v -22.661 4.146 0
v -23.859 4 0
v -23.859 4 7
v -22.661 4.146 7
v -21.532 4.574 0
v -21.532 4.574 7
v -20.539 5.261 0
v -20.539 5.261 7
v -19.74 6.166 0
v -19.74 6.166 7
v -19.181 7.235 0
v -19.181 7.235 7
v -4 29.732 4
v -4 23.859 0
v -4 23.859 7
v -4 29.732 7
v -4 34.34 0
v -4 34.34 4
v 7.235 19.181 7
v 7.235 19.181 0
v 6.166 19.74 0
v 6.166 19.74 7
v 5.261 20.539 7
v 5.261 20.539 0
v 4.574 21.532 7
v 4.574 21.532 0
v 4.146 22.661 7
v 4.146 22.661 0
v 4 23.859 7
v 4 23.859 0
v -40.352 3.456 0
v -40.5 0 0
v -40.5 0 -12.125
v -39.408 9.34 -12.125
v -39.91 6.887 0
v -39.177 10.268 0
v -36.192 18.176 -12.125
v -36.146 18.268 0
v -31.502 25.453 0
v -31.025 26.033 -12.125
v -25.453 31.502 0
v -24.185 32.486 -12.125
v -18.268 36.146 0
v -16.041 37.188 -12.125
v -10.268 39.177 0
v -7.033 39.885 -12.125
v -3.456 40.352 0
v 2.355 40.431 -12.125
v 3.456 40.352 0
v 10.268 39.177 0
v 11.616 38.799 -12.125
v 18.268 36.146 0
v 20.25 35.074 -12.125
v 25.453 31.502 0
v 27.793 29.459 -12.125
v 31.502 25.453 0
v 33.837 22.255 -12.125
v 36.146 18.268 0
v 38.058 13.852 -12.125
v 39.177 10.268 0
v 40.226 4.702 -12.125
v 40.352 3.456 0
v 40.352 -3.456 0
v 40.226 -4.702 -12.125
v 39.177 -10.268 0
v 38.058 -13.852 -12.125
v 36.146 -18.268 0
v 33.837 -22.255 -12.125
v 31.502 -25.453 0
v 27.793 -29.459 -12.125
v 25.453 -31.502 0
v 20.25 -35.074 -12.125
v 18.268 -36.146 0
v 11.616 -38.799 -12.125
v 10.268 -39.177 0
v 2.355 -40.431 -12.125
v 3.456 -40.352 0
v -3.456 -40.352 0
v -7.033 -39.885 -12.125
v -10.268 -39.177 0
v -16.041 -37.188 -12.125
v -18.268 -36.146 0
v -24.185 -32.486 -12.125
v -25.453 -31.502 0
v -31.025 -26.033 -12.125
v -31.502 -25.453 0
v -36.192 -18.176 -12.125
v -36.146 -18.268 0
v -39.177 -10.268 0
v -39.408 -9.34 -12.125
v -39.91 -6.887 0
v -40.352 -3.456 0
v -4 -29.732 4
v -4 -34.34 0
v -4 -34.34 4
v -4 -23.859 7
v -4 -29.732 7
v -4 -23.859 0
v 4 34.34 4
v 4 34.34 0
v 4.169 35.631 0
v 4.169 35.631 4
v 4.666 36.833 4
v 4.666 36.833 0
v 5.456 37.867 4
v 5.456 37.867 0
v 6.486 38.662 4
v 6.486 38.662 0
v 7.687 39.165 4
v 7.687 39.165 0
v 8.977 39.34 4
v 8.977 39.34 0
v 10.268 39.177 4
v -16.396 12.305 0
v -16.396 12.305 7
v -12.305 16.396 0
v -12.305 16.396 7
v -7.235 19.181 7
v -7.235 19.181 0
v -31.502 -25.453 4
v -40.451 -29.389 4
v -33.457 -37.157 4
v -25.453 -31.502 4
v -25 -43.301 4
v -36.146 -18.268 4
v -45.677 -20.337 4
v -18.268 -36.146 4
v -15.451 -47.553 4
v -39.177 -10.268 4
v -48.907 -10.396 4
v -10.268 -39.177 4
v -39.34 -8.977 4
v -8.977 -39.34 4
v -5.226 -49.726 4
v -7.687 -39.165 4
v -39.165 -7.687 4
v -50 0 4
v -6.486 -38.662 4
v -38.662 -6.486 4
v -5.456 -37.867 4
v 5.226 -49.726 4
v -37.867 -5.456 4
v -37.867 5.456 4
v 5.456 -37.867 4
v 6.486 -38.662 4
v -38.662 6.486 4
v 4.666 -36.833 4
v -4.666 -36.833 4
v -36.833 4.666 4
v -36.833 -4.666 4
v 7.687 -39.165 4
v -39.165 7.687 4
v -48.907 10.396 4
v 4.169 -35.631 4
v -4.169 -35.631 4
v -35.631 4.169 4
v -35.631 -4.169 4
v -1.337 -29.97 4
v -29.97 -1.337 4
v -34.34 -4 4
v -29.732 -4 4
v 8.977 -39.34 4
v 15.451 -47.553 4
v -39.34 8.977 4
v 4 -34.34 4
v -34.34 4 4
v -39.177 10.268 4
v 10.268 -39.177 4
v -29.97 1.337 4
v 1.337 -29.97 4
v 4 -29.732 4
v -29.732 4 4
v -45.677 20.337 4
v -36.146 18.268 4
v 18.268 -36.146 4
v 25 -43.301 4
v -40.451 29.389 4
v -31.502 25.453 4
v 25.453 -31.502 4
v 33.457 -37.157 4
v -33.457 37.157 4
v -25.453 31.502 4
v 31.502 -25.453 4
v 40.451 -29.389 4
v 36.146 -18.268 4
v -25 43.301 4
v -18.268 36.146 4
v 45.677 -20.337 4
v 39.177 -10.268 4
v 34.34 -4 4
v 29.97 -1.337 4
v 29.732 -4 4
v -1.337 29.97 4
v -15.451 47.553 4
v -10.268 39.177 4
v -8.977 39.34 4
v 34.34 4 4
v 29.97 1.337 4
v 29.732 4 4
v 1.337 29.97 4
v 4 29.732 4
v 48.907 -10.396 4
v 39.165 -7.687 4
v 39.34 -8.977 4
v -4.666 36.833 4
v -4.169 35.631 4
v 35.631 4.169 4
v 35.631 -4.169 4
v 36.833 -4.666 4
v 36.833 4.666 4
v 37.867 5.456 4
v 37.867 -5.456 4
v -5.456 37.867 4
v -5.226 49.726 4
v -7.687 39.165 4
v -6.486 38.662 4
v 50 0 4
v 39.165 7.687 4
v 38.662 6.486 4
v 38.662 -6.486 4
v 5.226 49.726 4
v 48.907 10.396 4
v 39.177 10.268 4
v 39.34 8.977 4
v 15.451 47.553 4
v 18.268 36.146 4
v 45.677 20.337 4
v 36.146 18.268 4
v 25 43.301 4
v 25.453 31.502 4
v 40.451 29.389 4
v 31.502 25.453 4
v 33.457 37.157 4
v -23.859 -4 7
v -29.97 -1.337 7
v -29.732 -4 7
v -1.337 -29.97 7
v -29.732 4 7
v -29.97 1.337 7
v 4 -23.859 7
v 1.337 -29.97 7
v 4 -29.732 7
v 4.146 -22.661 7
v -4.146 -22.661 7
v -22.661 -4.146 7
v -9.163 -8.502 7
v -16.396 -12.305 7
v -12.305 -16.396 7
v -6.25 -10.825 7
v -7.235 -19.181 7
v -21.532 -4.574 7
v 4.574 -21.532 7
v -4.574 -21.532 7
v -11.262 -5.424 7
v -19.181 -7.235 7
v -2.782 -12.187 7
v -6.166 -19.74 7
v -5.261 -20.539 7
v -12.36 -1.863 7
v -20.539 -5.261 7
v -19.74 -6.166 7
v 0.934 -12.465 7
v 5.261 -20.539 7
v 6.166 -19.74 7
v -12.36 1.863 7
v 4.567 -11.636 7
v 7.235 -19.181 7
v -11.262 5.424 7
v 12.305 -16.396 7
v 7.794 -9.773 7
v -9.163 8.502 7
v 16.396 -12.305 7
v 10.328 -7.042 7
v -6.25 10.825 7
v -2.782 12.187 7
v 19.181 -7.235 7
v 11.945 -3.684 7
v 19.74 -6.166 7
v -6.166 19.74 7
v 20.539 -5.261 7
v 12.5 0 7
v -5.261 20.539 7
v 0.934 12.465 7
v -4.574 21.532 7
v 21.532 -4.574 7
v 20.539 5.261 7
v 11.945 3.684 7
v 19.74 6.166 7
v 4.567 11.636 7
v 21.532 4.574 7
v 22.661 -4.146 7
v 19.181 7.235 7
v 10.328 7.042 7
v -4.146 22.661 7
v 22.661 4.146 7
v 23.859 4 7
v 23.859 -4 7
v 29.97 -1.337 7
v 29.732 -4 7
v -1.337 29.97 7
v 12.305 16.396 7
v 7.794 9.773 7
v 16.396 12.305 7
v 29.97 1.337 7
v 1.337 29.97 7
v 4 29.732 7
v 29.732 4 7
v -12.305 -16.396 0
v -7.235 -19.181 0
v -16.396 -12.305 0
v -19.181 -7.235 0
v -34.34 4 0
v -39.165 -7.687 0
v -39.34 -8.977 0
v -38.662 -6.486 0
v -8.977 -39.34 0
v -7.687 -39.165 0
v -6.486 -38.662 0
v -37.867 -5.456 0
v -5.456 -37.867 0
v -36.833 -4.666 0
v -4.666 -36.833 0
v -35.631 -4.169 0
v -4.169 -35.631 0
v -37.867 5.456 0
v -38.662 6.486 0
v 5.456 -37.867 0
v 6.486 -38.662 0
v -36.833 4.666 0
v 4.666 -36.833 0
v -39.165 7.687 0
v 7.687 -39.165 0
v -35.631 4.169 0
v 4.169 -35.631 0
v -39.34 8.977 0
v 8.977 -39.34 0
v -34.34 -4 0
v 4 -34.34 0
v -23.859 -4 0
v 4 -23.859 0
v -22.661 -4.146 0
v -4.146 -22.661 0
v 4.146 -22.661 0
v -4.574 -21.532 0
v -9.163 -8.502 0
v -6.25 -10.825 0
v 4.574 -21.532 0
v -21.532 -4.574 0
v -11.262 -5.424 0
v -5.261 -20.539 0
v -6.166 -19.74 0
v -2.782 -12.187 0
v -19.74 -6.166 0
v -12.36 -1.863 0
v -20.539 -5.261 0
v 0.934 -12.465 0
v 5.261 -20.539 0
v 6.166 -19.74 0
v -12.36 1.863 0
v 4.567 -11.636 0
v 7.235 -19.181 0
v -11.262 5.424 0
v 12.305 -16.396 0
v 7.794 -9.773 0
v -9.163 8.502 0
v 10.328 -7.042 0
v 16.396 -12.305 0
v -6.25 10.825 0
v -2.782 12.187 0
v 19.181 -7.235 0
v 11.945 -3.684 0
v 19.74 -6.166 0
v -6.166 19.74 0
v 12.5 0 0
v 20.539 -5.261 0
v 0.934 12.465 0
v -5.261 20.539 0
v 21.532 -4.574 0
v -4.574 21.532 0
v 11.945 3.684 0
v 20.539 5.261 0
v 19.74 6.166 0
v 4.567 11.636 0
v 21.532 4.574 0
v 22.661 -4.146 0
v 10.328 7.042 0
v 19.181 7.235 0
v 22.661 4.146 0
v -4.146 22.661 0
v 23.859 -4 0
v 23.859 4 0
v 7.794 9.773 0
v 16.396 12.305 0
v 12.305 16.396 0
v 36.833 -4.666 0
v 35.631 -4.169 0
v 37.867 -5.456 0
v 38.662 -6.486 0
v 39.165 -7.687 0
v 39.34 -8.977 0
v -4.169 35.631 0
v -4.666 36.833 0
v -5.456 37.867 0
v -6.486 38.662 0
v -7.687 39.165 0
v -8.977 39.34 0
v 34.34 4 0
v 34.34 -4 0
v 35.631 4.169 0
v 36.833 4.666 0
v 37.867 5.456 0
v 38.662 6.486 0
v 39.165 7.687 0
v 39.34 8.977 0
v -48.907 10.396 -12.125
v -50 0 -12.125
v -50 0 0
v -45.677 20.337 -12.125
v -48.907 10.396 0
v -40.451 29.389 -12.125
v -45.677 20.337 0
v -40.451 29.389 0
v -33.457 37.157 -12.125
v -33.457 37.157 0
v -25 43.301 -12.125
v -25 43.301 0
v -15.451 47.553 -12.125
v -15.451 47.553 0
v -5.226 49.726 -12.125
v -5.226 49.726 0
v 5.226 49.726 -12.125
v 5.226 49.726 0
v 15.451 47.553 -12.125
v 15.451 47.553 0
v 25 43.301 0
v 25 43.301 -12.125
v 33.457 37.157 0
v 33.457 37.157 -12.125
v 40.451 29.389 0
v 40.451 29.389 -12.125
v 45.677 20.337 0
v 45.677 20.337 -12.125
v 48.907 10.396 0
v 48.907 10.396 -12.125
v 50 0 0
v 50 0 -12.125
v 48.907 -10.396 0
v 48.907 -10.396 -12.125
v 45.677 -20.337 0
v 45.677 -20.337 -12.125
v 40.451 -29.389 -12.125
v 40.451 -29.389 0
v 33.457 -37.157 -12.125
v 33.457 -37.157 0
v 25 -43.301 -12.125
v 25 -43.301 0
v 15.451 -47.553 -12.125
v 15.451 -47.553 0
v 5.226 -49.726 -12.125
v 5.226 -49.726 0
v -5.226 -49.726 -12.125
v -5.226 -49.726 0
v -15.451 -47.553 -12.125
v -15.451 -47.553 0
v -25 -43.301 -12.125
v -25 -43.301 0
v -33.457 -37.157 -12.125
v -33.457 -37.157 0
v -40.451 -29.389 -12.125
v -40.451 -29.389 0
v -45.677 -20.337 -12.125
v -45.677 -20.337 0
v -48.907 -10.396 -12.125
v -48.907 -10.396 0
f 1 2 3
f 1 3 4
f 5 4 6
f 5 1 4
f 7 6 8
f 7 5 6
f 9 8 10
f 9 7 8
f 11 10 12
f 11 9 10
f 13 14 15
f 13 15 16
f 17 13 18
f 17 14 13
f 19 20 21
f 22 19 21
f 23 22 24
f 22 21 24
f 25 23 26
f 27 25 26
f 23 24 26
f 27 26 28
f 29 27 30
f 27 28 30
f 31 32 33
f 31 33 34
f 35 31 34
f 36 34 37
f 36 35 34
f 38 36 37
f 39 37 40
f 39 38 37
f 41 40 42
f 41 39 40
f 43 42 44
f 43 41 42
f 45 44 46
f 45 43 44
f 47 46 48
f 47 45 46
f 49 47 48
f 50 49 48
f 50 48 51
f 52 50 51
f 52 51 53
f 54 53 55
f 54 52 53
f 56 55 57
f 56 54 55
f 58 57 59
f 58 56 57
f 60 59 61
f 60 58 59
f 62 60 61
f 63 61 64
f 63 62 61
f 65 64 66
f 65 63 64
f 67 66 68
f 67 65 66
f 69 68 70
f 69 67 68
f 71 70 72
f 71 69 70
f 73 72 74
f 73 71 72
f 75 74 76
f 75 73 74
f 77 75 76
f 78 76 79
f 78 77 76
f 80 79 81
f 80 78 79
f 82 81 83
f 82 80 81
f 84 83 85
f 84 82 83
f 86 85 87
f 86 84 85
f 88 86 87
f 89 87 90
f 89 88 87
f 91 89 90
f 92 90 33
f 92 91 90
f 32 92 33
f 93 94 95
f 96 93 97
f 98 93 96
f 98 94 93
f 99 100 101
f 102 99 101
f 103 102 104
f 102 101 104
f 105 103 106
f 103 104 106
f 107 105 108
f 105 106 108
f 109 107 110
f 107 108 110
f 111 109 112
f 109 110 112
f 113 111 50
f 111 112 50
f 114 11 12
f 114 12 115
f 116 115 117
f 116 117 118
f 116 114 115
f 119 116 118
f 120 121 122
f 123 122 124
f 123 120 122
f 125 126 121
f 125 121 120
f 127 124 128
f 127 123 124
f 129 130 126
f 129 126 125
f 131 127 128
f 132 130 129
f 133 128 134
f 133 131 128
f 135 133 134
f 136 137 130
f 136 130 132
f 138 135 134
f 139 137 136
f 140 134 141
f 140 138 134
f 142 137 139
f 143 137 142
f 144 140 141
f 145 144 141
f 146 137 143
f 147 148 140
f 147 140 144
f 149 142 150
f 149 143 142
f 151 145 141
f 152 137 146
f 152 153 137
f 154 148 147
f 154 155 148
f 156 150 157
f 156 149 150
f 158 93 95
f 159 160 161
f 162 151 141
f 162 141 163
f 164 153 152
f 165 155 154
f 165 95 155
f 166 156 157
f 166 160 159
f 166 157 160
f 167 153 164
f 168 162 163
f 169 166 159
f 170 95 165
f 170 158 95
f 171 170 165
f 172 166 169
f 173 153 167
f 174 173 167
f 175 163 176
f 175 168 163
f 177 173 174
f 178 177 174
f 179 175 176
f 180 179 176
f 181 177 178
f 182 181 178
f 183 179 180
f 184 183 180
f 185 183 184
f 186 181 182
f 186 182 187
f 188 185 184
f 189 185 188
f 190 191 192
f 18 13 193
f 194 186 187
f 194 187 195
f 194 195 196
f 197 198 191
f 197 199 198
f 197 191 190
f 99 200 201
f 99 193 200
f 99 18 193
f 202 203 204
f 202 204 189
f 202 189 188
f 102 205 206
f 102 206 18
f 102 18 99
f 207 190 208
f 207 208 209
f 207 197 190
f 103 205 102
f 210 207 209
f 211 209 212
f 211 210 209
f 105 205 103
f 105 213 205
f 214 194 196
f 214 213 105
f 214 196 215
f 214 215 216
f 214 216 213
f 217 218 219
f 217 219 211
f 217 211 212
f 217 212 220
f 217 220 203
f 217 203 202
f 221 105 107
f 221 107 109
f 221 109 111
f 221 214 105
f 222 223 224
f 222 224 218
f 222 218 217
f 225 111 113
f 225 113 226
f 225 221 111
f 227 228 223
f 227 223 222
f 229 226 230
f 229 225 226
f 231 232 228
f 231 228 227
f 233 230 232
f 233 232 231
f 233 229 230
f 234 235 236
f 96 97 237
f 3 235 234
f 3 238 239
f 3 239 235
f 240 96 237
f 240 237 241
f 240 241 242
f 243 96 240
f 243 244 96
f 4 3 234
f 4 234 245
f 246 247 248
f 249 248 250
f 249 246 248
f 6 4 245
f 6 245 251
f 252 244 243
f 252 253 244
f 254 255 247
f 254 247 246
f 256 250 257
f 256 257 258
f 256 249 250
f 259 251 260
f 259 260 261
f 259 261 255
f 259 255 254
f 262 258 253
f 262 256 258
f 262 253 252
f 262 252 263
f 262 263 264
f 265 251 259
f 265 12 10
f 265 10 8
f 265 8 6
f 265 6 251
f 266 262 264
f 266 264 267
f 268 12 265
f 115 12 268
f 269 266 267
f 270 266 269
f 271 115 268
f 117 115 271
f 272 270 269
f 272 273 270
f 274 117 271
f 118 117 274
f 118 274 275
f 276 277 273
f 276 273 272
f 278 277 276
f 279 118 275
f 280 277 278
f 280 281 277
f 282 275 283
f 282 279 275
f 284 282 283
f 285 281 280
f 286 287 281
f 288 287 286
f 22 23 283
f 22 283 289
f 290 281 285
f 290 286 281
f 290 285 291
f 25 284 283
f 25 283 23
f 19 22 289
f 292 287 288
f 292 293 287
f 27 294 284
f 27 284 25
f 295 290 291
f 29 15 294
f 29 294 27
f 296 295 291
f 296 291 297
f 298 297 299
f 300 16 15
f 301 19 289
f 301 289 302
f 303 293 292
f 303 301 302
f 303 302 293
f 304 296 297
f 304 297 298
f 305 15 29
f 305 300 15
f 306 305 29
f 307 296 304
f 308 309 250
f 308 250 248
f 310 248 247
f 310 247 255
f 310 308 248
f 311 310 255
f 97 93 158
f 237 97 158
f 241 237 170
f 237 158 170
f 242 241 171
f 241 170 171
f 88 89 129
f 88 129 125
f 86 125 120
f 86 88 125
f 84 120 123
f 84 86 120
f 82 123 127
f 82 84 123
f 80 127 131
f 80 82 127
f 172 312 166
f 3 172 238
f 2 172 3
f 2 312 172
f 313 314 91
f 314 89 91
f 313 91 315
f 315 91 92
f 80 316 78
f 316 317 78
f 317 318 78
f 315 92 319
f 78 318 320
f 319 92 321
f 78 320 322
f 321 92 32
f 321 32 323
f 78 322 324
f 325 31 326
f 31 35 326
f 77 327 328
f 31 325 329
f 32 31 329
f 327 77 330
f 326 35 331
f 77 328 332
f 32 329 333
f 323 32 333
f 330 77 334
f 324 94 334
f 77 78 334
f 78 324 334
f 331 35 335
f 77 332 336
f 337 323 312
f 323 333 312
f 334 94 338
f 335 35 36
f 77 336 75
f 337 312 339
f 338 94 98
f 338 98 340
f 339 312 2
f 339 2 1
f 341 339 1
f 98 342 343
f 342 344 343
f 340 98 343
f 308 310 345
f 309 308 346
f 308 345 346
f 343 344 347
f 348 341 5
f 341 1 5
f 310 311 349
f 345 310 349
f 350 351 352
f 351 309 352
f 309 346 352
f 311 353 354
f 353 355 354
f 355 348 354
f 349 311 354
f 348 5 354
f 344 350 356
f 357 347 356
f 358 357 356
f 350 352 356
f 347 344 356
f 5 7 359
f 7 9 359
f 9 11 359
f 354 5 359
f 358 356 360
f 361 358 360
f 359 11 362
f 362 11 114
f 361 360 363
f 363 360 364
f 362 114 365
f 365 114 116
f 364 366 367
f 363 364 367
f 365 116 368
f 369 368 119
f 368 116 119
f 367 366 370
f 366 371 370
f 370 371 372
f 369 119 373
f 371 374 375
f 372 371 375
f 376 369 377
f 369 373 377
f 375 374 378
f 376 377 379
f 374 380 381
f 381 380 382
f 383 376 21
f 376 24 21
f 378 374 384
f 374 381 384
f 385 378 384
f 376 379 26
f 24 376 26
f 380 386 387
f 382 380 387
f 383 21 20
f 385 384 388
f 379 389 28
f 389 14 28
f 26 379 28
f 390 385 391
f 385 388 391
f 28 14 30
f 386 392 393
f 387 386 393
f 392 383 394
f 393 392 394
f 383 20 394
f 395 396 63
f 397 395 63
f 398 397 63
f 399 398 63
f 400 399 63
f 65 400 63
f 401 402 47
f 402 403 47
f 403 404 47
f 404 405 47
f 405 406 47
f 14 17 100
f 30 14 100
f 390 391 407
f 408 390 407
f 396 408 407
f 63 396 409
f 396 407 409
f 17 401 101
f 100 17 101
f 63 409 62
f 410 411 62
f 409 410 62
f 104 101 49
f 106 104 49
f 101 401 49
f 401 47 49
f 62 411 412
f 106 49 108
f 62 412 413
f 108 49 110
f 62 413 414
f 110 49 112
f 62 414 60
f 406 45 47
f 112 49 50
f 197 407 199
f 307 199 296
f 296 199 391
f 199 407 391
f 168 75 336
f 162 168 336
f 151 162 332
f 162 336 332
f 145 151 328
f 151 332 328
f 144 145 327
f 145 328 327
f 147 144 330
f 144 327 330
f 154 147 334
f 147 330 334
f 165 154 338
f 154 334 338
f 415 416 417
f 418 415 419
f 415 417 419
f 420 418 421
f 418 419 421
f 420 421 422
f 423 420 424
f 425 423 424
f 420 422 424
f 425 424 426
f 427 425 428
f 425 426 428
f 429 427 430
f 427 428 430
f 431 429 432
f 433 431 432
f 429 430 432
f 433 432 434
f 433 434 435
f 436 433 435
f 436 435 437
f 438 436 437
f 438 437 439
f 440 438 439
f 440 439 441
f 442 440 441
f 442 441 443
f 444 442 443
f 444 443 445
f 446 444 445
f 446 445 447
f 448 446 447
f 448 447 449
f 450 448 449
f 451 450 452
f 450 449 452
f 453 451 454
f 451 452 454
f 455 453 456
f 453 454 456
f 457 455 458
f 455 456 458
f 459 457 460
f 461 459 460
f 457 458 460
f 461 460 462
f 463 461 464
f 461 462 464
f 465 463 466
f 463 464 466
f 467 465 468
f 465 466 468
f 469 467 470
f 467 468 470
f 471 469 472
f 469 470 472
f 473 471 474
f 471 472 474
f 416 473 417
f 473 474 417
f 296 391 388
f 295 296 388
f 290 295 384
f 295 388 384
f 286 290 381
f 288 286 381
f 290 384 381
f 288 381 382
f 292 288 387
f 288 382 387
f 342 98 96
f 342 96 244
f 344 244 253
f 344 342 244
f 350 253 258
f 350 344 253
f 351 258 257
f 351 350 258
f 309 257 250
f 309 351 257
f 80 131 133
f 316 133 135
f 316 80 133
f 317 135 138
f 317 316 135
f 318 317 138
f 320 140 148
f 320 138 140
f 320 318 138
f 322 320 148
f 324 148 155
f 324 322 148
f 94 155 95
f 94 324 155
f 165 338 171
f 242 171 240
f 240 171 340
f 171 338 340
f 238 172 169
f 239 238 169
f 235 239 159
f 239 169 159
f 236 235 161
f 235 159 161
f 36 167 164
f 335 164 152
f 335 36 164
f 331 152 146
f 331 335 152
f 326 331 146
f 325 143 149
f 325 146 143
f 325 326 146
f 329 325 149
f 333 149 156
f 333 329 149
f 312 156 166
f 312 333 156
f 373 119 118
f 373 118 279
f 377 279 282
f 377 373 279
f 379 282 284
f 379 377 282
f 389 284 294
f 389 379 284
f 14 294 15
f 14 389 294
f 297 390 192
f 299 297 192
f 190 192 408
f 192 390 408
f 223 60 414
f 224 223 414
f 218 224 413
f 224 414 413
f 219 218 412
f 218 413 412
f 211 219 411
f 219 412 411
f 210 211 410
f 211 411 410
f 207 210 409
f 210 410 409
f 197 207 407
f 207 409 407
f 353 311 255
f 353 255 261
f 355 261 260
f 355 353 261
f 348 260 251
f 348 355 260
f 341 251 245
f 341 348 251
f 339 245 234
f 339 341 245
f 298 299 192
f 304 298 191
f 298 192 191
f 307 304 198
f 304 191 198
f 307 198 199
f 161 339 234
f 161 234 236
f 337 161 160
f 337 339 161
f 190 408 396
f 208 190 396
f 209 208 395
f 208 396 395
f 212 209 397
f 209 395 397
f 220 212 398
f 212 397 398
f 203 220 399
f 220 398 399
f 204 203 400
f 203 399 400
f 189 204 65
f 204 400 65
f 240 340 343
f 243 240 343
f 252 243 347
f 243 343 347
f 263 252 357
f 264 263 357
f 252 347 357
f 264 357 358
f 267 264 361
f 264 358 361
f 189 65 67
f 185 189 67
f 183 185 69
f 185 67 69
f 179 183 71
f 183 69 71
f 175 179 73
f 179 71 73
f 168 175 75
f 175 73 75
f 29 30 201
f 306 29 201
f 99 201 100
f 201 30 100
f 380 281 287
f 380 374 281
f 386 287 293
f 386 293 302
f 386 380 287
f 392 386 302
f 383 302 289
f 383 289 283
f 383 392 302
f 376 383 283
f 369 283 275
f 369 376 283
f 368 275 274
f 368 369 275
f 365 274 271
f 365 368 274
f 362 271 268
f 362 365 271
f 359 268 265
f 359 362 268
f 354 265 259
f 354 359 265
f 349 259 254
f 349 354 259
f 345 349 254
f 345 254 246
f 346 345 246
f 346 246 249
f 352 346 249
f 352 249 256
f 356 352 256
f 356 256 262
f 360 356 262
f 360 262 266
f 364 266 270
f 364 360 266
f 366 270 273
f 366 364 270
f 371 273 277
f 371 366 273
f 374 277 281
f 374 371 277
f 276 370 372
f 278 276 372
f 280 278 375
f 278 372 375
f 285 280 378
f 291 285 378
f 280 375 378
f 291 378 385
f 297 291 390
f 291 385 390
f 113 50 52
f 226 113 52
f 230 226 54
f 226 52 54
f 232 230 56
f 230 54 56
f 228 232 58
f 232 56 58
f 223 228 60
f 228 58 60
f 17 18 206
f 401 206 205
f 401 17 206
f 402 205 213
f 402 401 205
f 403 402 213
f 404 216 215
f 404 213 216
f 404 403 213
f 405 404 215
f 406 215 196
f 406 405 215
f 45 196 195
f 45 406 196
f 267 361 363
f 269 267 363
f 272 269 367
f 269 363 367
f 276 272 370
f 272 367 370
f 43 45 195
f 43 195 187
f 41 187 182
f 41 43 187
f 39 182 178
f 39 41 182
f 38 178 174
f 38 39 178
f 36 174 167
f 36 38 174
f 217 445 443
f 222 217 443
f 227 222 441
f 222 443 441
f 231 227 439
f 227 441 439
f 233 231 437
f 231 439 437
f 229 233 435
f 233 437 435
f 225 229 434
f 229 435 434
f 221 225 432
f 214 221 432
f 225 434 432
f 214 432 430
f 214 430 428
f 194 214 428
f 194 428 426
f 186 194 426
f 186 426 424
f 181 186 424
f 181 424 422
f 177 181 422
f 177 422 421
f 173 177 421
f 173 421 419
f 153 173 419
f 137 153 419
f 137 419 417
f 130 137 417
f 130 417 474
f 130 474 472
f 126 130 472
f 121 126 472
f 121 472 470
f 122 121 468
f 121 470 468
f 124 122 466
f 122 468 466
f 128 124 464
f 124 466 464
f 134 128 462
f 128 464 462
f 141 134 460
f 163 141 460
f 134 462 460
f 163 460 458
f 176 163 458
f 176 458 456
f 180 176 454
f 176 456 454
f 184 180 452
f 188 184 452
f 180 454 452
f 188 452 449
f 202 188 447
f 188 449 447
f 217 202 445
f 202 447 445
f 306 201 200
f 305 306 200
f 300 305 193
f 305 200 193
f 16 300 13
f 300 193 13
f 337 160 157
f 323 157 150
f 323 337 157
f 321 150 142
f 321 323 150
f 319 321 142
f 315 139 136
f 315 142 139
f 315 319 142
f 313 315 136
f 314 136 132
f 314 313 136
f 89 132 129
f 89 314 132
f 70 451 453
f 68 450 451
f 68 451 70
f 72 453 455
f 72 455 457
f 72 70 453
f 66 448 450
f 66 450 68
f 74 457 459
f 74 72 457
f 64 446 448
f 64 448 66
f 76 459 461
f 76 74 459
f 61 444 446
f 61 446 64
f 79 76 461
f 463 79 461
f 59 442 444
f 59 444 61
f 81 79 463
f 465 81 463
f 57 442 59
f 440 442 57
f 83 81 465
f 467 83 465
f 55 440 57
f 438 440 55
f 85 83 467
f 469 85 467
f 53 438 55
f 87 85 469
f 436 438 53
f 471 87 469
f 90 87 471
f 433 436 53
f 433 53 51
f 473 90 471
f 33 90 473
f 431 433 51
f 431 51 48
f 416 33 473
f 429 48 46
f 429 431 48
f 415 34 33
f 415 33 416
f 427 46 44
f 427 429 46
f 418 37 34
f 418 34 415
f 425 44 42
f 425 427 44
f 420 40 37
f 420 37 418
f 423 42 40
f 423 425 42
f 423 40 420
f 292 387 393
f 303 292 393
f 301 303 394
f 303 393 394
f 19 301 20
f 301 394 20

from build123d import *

# Parameters (mm, degrees)
ESQUISSE1_R             = 50
ESQUISSE1_R_2           = 12.5
BOSS_EXTRU_1_DEPTH      = 4
ESQUISSE2_R             = 30
ESQUISSE2_R_2           = 12.5
BOSS_EXTRU_2_DEPTH      = 3
ENL_V_MAT_EXTRU_1_DEPTH = 23
ESQUISSE5_R             = 50
ESQUISSE5_R_2           = 40.5
BOSS_EXTRU_3_DEPTH      = 12.125


with BuildPart() as part:
    # Esquisse1 → Boss.-Extru.1 (new body)
    with BuildSketch(Plane.XY):
        Circle(ESQUISSE1_R)
        Circle(ESQUISSE1_R_2, mode=Mode.SUBTRACT)
    extrude(amount=BOSS_EXTRU_1_DEPTH)

    # Esquisse2 → Boss.-Extru.2 (add)
    with BuildSketch(Plane.XY.offset(4)):
        Circle(ESQUISSE2_R)
        Circle(ESQUISSE2_R_2, mode=Mode.SUBTRACT)
    extrude(amount=BOSS_EXTRU_2_DEPTH)

    # Esquisse4 → Enlèv. mat.-Extru.1 (cut)
    with BuildSketch(Plane(origin=(0, 0, 0), x_dir=(-1, 0, 0), z_dir=(0, 0, -1))):
        with BuildLine():
            Line((-4, 23.858960581), (-4, 34.340209667))
            ThreePointArc((-4, 34.340209667), (-5.945333747, 38.298620218), (-10.267605634, 39.176858916))
            ThreePointArc((-10.267605634, 39.176858916), (-28.637824638, 28.637824638), (-39.176858916, 10.267605634))
            ThreePointArc((-39.176858916, 10.267605634), (-38.298620218, 5.945333747), (-34.340209667, 4))
            Line((-34.340209667, 4), (-23.858960581, 4))
            ThreePointArc((-23.858960581, 4), (-21.014978286, 4.887608396), (-19.180733016, 7.235294118))
            ThreePointArc((-19.180733016, 7.235294118), (-14.495689014, 14.495689014), (-7.235294118, 19.180733016))
            ThreePointArc((-7.235294118, 19.180733016), (-4.887608396, 21.014978286), (-4, 23.858960581))
        make_face()
        with BuildLine():
            Line((4, 23.858960581), (4, 34.340209667))
            ThreePointArc((4, 34.340209667), (5.945333747, 38.298620218), (10.267605634, 39.176858916))
            ThreePointArc((10.267605634, 39.176858916), (28.637824638, 28.637824638), (39.176858916, 10.267605634))
            ThreePointArc((39.176858916, 10.267605634), (38.298620218, 5.945333747), (34.340209667, 4))
            Line((34.340209667, 4), (23.858960581, 4))
            ThreePointArc((23.858960581, 4), (21.014978286, 4.887608396), (19.180733016, 7.235294118))
            ThreePointArc((19.180733016, 7.235294118), (14.495689014, 14.495689014), (7.235294118, 19.180733016))
            ThreePointArc((7.235294118, 19.180733016), (4.887608396, 21.014978286), (4, 23.858960581))
        make_face()
        with BuildLine():
            Line((-23.858960581, -4), (-34.340209667, -4))
            ThreePointArc((-34.340209667, -4), (-38.298620218, -5.945333747), (-39.176858916, -10.267605634))
            ThreePointArc((-39.176858916, -10.267605634), (-28.637824638, -28.637824638), (-10.267605634, -39.176858916))
            ThreePointArc((-10.267605634, -39.176858916), (-5.945333747, -38.298620218), (-4, -34.340209667))
            Line((-4, -34.340209667), (-4, -23.858960581))
            ThreePointArc((-4, -23.858960581), (-4.887608396, -21.014978286), (-7.235294118, -19.180733016))
            ThreePointArc((-7.235294118, -19.180733016), (-14.495689014, -14.495689014), (-19.180733016, -7.235294118))
            ThreePointArc((-19.180733016, -7.235294118), (-21.014978286, -4.887608396), (-23.858960581, -4))
        make_face()
        with BuildLine():
            Line((23.858960581, -4), (34.340209667, -4))
            ThreePointArc((34.340209667, -4), (38.298620218, -5.945333747), (39.176858916, -10.267605634))
            ThreePointArc((39.176858916, -10.267605634), (28.637824638, -28.637824638), (10.267605634, -39.176858916))
            ThreePointArc((10.267605634, -39.176858916), (5.945333747, -38.298620218), (4, -34.340209667))
            Line((4, -34.340209667), (4, -23.858960581))
            ThreePointArc((4, -23.858960581), (4.887608396, -21.014978286), (7.235294118, -19.180733016))
            ThreePointArc((7.235294118, -19.180733016), (14.495689014, -14.495689014), (19.180733016, -7.235294118))
            ThreePointArc((19.180733016, -7.235294118), (21.014978286, -4.887608396), (23.858960581, -4))
        make_face()
    extrude(amount=-ENL_V_MAT_EXTRU_1_DEPTH, mode=Mode.SUBTRACT)

    # Esquisse5 → Boss.-Extru.3 (add)
    with BuildSketch(Plane(origin=(0, 0, 0), x_dir=(-1, 0, 0), z_dir=(0, 0, -1))):
        Circle(ESQUISSE5_R)
        Circle(ESQUISSE5_R_2, mode=Mode.SUBTRACT)
    extrude(amount=BOSS_EXTRU_3_DEPTH)


solid = part.part
